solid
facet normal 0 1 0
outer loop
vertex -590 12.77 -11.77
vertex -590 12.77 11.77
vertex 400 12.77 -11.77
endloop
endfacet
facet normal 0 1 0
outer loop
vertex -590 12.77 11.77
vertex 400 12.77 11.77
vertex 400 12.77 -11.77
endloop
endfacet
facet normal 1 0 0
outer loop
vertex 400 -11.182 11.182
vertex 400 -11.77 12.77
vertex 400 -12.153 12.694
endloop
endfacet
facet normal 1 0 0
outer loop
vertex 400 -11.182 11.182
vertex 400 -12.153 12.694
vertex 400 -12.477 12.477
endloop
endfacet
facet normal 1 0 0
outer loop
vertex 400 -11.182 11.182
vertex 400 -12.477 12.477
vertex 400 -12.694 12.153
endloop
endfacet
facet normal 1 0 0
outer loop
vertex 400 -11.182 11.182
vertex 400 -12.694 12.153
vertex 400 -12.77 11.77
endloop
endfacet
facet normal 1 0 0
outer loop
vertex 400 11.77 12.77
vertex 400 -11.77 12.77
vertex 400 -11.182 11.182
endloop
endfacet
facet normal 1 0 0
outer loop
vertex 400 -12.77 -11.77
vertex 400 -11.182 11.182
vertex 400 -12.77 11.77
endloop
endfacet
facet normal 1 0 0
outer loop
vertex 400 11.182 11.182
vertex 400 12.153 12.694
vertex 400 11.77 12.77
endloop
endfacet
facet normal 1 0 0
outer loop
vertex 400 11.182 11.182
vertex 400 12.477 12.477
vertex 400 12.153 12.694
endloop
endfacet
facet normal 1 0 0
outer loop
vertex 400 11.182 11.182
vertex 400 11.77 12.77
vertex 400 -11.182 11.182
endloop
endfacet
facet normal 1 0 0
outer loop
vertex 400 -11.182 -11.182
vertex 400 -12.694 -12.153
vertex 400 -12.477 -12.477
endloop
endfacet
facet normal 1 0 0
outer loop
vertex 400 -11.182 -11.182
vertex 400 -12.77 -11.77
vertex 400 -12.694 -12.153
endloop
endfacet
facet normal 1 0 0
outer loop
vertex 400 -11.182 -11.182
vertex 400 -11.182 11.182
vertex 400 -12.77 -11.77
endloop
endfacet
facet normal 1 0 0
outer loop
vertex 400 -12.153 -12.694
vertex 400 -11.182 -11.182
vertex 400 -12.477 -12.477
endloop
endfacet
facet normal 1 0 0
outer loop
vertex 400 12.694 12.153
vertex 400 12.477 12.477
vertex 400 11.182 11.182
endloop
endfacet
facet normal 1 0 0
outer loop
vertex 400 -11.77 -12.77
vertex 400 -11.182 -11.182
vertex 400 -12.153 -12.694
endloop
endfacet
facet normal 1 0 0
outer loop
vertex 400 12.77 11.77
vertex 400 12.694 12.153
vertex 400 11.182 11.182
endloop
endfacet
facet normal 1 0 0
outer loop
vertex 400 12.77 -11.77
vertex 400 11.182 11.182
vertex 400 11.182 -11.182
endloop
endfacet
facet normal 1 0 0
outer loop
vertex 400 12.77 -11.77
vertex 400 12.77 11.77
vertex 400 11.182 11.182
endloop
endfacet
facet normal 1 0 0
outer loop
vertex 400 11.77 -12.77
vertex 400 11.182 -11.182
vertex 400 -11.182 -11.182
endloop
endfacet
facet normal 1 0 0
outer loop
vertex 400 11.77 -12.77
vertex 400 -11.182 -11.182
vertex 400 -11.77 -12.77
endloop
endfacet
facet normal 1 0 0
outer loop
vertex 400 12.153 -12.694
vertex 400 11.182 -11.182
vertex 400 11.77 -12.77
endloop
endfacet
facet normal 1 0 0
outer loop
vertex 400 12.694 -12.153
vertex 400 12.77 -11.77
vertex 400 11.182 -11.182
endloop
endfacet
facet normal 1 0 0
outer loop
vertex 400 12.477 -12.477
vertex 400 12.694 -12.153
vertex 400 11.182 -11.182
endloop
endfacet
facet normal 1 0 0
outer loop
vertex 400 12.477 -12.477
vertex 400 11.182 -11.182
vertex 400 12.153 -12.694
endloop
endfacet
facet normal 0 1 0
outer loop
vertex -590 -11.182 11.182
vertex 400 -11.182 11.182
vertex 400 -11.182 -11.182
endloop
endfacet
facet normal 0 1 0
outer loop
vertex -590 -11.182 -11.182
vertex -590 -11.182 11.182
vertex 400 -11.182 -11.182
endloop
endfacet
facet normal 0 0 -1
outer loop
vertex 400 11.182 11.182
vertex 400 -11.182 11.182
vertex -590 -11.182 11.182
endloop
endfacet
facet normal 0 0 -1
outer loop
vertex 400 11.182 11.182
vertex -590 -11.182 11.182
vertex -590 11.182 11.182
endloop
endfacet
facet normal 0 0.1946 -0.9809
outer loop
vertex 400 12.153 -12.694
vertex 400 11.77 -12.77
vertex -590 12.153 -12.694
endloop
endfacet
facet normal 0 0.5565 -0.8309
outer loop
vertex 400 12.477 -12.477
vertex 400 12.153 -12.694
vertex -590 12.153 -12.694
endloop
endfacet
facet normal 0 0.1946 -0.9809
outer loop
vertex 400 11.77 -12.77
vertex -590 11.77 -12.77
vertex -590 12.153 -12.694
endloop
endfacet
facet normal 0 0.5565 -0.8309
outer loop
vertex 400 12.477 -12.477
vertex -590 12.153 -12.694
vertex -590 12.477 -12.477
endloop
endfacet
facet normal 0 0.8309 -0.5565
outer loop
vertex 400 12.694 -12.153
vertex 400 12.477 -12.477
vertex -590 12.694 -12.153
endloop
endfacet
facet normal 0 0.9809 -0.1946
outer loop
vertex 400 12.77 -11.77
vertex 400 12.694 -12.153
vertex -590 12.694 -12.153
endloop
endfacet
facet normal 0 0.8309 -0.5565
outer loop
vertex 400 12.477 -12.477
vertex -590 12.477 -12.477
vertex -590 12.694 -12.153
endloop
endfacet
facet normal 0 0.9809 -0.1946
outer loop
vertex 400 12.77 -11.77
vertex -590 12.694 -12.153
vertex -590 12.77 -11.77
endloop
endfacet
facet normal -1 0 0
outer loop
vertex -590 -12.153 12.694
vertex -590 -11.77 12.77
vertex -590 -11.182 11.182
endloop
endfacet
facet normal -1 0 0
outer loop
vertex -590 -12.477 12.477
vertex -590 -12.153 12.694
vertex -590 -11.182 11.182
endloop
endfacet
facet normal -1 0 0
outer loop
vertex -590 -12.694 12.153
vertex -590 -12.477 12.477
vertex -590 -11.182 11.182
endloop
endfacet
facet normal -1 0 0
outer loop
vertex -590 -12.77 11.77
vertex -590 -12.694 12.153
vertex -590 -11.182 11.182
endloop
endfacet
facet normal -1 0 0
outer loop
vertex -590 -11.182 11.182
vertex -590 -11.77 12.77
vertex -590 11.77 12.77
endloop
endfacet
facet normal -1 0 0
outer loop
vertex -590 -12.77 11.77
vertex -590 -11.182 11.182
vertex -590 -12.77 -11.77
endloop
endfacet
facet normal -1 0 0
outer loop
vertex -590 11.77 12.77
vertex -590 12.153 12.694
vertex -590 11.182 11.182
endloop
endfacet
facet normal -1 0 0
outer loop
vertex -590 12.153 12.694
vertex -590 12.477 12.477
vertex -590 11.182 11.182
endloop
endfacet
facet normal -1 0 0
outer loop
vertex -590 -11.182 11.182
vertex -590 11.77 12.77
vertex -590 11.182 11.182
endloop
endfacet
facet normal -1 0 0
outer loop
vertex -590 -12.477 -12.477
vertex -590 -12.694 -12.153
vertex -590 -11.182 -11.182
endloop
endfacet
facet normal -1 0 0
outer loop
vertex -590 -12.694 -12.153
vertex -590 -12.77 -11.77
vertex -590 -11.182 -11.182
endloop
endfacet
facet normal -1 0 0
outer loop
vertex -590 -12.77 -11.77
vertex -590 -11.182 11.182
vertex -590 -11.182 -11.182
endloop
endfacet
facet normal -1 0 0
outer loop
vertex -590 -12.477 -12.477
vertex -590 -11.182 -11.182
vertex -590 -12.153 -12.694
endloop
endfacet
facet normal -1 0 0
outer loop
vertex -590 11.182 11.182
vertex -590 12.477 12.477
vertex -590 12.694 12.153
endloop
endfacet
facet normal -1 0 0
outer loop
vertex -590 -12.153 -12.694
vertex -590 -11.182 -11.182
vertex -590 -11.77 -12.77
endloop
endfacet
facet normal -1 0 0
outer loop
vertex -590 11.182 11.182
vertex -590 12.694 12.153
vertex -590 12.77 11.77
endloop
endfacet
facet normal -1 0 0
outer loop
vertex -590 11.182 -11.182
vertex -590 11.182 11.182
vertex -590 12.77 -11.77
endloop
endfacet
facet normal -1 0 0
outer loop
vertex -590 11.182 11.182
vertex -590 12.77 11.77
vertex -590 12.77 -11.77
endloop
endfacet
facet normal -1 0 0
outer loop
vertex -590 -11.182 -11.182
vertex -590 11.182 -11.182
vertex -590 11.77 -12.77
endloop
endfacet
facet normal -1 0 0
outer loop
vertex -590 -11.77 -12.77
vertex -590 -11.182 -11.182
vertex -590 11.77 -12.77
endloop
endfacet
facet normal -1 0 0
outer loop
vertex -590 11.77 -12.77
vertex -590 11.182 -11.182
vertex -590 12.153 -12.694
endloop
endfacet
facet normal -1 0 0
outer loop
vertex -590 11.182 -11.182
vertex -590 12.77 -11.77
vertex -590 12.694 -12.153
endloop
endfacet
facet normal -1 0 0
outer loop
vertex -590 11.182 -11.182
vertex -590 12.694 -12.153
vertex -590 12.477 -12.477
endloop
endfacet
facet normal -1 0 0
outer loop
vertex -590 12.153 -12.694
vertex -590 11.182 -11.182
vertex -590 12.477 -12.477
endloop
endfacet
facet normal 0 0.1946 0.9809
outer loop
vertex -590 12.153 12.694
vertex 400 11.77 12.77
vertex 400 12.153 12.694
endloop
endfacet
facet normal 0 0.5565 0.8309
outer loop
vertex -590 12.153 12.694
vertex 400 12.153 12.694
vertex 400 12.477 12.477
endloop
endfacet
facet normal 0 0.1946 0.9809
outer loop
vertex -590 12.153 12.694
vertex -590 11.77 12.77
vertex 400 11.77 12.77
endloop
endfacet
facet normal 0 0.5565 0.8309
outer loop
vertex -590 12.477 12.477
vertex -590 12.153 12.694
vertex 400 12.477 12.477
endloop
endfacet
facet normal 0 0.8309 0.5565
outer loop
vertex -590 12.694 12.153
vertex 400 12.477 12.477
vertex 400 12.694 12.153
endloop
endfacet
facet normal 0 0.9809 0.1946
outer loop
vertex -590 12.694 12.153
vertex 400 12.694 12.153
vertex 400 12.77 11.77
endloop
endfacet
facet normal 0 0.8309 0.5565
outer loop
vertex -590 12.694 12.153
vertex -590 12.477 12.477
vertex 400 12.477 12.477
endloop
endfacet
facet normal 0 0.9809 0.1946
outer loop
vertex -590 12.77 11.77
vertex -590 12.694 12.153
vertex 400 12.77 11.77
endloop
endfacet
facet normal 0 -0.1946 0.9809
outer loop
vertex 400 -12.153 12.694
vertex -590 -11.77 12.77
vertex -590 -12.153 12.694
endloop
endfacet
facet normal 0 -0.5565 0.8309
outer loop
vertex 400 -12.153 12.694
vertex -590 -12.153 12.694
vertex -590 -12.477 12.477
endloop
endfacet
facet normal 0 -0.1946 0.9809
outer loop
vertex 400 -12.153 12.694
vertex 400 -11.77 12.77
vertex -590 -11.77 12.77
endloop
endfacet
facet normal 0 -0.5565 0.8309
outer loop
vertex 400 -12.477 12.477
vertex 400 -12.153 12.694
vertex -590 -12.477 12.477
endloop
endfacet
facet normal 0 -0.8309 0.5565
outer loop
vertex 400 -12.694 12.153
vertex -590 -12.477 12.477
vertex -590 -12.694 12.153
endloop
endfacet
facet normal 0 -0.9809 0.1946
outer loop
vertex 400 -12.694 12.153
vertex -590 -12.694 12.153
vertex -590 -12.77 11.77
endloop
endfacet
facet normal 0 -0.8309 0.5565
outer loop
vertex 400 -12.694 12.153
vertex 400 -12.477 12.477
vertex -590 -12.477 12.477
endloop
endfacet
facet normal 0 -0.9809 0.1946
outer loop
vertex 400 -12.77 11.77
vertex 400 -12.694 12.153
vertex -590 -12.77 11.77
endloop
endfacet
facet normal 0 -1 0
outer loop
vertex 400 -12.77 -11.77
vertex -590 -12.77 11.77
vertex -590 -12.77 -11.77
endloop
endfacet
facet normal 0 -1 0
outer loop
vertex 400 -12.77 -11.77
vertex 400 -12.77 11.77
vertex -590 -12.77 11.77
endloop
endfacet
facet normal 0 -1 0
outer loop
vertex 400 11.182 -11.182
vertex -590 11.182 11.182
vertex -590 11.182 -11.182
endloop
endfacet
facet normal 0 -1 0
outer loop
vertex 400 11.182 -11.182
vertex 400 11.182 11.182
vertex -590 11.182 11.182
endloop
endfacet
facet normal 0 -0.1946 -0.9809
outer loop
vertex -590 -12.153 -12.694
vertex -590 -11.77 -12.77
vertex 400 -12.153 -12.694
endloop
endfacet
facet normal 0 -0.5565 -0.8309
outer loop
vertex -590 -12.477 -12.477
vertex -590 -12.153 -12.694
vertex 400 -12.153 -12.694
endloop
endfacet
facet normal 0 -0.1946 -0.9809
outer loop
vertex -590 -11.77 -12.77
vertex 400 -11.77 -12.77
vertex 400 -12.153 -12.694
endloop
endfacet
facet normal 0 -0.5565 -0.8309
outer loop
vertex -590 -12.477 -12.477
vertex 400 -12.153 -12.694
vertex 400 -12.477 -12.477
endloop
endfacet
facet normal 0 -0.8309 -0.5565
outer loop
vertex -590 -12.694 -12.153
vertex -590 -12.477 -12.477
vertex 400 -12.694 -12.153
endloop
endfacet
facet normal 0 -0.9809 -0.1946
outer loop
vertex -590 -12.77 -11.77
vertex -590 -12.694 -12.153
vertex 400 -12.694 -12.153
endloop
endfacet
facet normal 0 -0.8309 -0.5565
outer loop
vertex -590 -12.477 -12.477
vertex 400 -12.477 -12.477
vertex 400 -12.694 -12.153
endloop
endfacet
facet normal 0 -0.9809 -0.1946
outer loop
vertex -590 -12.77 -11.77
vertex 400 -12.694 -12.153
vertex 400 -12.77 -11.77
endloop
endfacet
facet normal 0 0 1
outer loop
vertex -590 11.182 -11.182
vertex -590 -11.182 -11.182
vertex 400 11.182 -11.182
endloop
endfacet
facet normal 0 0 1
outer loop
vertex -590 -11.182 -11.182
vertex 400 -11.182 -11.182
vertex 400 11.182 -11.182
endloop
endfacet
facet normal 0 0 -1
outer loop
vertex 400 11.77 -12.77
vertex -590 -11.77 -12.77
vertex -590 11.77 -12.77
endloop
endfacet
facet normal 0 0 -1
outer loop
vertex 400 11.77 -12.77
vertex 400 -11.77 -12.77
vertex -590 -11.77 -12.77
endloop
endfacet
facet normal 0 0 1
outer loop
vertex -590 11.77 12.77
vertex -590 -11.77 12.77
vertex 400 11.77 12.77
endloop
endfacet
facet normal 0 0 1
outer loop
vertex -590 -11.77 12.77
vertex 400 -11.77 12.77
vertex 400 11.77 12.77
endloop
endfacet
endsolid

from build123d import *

# Parameters (mm, degrees)
SKETCH2_W                = 25.54
SKETCH2_H                = 25.54
SKETCH2_W_2              = 22.365
SKETCH2_H_2              = 22.365
BOSS_EXTRUDE1_DEPTH      = 400
BOSS_EXTRUDE1_DEPTH_BACK = 590
FILLET1_R                = 1


with BuildPart() as part:
    # Sketch2 → Boss-Extrude1 (new body, two sides)
    with BuildSketch(Plane(origin=(0, 0, 0), x_dir=(0, 0, -1), z_dir=(1, 0, 0))) as boss_extrude1_sk:
        Rectangle(SKETCH2_W, SKETCH2_H)
        Rectangle(SKETCH2_W_2, SKETCH2_H_2, mode=Mode.SUBTRACT)
    extrude(amount=BOSS_EXTRUDE1_DEPTH)
    extrude(boss_extrude1_sk.sketch, amount=-BOSS_EXTRUDE1_DEPTH_BACK)

    # Fillet1
    fillet1_edges = [part.edges().sort_by_distance(p)[0] for p in [
        (-95, -12.77, -12.77),
        (-95, -12.77, 12.77),
        (-95, 12.77, 12.77),
        (-95, 12.77, -12.77),
    ]]
    fillet(fillet1_edges, radius=FILLET1_R)


solid = part.part
